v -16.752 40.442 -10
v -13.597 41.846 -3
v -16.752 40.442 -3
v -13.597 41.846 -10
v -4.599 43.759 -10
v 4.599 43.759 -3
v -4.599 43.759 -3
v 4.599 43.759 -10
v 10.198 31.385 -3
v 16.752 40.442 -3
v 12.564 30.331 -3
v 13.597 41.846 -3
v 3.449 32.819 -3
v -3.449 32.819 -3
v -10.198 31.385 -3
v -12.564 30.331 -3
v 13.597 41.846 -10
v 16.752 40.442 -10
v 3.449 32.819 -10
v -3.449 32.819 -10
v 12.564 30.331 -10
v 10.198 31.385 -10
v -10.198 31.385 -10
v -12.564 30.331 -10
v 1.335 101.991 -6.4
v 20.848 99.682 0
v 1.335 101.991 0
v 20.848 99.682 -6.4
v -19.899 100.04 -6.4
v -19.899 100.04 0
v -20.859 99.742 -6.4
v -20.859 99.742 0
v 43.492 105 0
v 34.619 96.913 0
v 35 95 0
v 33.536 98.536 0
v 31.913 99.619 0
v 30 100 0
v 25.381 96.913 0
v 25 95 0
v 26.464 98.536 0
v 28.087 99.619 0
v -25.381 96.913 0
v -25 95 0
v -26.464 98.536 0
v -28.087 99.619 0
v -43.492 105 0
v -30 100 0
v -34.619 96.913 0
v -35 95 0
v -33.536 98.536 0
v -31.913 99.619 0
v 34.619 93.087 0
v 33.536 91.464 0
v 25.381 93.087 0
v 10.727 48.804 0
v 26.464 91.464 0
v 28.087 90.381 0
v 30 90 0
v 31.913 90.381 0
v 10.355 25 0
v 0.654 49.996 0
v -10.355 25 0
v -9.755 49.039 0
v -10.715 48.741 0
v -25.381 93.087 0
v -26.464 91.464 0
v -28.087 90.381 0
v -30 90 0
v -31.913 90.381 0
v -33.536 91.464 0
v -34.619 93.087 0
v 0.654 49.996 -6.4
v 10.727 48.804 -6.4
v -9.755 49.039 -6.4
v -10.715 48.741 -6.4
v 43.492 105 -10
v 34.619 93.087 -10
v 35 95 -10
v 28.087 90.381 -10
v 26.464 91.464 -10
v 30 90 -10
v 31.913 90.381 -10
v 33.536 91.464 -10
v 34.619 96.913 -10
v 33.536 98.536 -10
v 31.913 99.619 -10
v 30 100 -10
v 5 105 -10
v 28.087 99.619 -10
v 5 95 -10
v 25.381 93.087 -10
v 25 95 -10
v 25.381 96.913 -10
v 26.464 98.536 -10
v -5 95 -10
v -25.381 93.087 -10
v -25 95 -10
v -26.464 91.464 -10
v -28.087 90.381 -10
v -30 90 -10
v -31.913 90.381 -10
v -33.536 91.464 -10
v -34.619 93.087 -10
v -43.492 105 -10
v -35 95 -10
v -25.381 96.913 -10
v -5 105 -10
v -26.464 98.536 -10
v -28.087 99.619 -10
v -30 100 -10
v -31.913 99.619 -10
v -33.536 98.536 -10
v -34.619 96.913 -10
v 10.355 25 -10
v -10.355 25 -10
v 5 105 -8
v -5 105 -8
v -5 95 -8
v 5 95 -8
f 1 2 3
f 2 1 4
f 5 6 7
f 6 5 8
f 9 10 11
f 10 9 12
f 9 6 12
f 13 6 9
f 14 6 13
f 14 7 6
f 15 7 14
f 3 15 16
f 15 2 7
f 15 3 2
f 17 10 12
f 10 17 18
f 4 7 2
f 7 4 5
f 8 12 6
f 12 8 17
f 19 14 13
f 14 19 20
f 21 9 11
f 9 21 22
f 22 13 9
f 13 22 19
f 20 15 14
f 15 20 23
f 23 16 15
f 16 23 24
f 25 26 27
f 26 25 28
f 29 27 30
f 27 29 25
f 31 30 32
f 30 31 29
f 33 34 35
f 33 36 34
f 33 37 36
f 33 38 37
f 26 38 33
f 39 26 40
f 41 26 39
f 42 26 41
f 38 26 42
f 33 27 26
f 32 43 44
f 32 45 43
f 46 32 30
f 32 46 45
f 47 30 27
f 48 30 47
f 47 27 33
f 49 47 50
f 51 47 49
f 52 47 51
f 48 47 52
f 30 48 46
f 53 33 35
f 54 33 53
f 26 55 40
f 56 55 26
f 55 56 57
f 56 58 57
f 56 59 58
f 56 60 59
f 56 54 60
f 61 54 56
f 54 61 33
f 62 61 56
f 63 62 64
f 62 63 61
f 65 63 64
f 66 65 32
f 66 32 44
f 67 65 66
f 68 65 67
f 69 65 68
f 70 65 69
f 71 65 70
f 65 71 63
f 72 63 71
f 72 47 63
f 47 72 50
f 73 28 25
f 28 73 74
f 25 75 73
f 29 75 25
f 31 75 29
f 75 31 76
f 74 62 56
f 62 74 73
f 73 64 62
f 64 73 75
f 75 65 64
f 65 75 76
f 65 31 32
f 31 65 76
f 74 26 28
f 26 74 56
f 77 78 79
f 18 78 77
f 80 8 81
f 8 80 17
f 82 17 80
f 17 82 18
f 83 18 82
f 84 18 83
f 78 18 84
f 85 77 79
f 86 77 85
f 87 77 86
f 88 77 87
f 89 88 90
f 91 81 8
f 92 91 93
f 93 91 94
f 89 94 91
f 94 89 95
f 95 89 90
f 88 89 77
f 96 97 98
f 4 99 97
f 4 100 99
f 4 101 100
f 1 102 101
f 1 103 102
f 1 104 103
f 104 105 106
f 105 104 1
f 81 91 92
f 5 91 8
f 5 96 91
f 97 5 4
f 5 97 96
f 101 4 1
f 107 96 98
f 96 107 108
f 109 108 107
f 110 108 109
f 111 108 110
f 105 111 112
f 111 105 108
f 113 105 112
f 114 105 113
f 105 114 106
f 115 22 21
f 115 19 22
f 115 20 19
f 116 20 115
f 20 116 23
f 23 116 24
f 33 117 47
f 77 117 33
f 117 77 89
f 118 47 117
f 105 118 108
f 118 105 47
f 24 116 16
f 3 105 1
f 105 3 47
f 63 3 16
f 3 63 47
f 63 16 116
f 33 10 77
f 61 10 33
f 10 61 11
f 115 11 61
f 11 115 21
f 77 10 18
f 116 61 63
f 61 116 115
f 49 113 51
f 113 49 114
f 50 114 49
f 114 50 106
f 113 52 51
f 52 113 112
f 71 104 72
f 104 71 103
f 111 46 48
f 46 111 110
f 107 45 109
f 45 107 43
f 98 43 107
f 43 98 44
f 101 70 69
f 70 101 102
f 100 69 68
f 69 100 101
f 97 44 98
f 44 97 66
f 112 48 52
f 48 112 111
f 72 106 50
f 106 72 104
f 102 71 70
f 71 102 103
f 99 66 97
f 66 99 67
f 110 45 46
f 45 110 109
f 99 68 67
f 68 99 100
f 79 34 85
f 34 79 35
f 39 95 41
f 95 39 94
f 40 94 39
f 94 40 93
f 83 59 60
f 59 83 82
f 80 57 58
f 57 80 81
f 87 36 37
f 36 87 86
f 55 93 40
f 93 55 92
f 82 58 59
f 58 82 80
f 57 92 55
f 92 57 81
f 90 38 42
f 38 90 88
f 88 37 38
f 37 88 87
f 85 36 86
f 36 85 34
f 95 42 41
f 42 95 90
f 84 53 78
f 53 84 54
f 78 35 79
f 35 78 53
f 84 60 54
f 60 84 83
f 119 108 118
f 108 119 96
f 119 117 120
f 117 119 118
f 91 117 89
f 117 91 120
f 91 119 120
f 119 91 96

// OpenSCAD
// file: magnet.scad
include <params.scad>


module ring() {
	difference() {
		cylinder(h=mag_height, r=mag_ring_or);
		translate([0, 0, -1]) cylinder(h=mag_height+2, r=mag_ring_ir);
	}
}

module block() { cube([(mag_ring_or*2)+2, mag_ring_or+2, mag_height+2]); }

module magnet() {
	intersection() {
		ring();
		translate([-mag_ring_or-1, -1, -1]) block();
		rotate(v=[0,0,1], a=360/mag_count) translate([-mag_ring_or-1, -mag_ring_or-1, -1]) block();
	}
}


magnet();
// file: bearing.scad
/*
 * DISCLAIMER!
 * THIS IS NOT A PRINTED PART
 * IT IS A PLACEHOLDER FOR A THIRD-PARTY BEARING
 */
include <params.scad>

module bearing() {
  difference() {
    cylinder(h=bearing_height,  r=bearing_or);
    cylinder(h=bearing_height, r=bearing_ir);
  }
}

bearing();
// file: params.scad
// GLOBAL
hole_radius = 5;
peg_radius = 4.5;

// MAGNET
mag_height = 6.4;
mag_ring_ir = 50;
mag_ring_or = 102;
mag_count = 16;

// BEARING
bearing_height = 17;
bearing_ir = 33;
bearing_or = 44;

// STATOR
stator_height = 20;
stator_inner_height = 10;
stator_bearing_inset = (stator_height/2) - 1;
stator_count = 6;
stator_incidence = 360/stator_count;
stator_radius = 115;
stator_tab_width = 10;
stator_tab_offset = 50;
stator_wiring_gap = 25;
stator_wiring_gap_inset = stator_radius - (stator_wiring_gap + 10);
stator_outer_tab_extrude = 15;
stator_outer_tab_width = 30;
stator_notch = 15;
stator_notch_width = 5;
coil_edge = 80;

// ROTOR & ROTOR CAP
rotor_height = 10;
rotor_inner_height = 3;
rotor_radius = 105;
rotor_inner_diameter = 25;
rotor_count = 8;
rotor_incidence = 360/rotor_count;
rotor_tie_hole_offset = 30;
rotor_notch = 10;
rotor_notch_height = 2;

rotor_cap_radius = 50;
rotor_cap_peg_radius = 35;
rotor_cap_inner_radius = 10;
rotor_cap_height = 10;
rotor_cap_insert_height = 10;
rotor_cap_bearing_inset = (bearing_height + rotor_inner_height) - rotor_cap_height;
rotor_plate_height = 5;
blade_holder_edge = 20;

// ROTOR EDGE TIE
rotor_edge_tie_length = 40;
rotor_edge_tie_width = 20;
rotor_edge_tie_inner_height = 5;
rotor_edge_tie_height = 15;
rotor_edge_tie_peg_inset = 10;
// main file
include <params.scad>
use <bearing.scad>
use <magnet.scad>

rotor_edge = 100;
bearing_inset = bearing_height - (stator_bearing_inset + 1);

module subtractor() {
  rotate([0, 0, -22.5]) {
    cube([rotor_edge/2, rotor_radius + 20, rotor_height]);
  }
}

module rotor_raw() {
  difference() {
    translate([-rotor_edge/2, 0, 0]) { cube([rotor_edge, rotor_radius, rotor_height]); }
    subtractor();
    mirror([1, 0, 0]) { subtractor(); }
    translate([-rotor_edge/2, 0, 0]) { cube([rotor_edge, 25, rotor_height]); }
    translate([0, 0, rotor_height - bearing_inset]) bearing();
    translate([rotor_tie_hole_offset, rotor_radius - 10, 0]) { cylinder(h=rotor_height, r=hole_radius); }
    translate([-rotor_tie_hole_offset, rotor_radius - 10, 0]) { cylinder(h=rotor_height, r=hole_radius); }
    rotate([0, 0, rotor_incidence*1.75]) { magnet(); }
    translate([rotor_notch/-2, rotor_radius - rotor_notch, rotor_height - rotor_notch_height]) {
      cube([rotor_notch, rotor_notch, rotor_notch_height]);
    }
  }
}

module rotor() {
  rotate([0, 180, 0]) rotor_raw();
}

rotor();
